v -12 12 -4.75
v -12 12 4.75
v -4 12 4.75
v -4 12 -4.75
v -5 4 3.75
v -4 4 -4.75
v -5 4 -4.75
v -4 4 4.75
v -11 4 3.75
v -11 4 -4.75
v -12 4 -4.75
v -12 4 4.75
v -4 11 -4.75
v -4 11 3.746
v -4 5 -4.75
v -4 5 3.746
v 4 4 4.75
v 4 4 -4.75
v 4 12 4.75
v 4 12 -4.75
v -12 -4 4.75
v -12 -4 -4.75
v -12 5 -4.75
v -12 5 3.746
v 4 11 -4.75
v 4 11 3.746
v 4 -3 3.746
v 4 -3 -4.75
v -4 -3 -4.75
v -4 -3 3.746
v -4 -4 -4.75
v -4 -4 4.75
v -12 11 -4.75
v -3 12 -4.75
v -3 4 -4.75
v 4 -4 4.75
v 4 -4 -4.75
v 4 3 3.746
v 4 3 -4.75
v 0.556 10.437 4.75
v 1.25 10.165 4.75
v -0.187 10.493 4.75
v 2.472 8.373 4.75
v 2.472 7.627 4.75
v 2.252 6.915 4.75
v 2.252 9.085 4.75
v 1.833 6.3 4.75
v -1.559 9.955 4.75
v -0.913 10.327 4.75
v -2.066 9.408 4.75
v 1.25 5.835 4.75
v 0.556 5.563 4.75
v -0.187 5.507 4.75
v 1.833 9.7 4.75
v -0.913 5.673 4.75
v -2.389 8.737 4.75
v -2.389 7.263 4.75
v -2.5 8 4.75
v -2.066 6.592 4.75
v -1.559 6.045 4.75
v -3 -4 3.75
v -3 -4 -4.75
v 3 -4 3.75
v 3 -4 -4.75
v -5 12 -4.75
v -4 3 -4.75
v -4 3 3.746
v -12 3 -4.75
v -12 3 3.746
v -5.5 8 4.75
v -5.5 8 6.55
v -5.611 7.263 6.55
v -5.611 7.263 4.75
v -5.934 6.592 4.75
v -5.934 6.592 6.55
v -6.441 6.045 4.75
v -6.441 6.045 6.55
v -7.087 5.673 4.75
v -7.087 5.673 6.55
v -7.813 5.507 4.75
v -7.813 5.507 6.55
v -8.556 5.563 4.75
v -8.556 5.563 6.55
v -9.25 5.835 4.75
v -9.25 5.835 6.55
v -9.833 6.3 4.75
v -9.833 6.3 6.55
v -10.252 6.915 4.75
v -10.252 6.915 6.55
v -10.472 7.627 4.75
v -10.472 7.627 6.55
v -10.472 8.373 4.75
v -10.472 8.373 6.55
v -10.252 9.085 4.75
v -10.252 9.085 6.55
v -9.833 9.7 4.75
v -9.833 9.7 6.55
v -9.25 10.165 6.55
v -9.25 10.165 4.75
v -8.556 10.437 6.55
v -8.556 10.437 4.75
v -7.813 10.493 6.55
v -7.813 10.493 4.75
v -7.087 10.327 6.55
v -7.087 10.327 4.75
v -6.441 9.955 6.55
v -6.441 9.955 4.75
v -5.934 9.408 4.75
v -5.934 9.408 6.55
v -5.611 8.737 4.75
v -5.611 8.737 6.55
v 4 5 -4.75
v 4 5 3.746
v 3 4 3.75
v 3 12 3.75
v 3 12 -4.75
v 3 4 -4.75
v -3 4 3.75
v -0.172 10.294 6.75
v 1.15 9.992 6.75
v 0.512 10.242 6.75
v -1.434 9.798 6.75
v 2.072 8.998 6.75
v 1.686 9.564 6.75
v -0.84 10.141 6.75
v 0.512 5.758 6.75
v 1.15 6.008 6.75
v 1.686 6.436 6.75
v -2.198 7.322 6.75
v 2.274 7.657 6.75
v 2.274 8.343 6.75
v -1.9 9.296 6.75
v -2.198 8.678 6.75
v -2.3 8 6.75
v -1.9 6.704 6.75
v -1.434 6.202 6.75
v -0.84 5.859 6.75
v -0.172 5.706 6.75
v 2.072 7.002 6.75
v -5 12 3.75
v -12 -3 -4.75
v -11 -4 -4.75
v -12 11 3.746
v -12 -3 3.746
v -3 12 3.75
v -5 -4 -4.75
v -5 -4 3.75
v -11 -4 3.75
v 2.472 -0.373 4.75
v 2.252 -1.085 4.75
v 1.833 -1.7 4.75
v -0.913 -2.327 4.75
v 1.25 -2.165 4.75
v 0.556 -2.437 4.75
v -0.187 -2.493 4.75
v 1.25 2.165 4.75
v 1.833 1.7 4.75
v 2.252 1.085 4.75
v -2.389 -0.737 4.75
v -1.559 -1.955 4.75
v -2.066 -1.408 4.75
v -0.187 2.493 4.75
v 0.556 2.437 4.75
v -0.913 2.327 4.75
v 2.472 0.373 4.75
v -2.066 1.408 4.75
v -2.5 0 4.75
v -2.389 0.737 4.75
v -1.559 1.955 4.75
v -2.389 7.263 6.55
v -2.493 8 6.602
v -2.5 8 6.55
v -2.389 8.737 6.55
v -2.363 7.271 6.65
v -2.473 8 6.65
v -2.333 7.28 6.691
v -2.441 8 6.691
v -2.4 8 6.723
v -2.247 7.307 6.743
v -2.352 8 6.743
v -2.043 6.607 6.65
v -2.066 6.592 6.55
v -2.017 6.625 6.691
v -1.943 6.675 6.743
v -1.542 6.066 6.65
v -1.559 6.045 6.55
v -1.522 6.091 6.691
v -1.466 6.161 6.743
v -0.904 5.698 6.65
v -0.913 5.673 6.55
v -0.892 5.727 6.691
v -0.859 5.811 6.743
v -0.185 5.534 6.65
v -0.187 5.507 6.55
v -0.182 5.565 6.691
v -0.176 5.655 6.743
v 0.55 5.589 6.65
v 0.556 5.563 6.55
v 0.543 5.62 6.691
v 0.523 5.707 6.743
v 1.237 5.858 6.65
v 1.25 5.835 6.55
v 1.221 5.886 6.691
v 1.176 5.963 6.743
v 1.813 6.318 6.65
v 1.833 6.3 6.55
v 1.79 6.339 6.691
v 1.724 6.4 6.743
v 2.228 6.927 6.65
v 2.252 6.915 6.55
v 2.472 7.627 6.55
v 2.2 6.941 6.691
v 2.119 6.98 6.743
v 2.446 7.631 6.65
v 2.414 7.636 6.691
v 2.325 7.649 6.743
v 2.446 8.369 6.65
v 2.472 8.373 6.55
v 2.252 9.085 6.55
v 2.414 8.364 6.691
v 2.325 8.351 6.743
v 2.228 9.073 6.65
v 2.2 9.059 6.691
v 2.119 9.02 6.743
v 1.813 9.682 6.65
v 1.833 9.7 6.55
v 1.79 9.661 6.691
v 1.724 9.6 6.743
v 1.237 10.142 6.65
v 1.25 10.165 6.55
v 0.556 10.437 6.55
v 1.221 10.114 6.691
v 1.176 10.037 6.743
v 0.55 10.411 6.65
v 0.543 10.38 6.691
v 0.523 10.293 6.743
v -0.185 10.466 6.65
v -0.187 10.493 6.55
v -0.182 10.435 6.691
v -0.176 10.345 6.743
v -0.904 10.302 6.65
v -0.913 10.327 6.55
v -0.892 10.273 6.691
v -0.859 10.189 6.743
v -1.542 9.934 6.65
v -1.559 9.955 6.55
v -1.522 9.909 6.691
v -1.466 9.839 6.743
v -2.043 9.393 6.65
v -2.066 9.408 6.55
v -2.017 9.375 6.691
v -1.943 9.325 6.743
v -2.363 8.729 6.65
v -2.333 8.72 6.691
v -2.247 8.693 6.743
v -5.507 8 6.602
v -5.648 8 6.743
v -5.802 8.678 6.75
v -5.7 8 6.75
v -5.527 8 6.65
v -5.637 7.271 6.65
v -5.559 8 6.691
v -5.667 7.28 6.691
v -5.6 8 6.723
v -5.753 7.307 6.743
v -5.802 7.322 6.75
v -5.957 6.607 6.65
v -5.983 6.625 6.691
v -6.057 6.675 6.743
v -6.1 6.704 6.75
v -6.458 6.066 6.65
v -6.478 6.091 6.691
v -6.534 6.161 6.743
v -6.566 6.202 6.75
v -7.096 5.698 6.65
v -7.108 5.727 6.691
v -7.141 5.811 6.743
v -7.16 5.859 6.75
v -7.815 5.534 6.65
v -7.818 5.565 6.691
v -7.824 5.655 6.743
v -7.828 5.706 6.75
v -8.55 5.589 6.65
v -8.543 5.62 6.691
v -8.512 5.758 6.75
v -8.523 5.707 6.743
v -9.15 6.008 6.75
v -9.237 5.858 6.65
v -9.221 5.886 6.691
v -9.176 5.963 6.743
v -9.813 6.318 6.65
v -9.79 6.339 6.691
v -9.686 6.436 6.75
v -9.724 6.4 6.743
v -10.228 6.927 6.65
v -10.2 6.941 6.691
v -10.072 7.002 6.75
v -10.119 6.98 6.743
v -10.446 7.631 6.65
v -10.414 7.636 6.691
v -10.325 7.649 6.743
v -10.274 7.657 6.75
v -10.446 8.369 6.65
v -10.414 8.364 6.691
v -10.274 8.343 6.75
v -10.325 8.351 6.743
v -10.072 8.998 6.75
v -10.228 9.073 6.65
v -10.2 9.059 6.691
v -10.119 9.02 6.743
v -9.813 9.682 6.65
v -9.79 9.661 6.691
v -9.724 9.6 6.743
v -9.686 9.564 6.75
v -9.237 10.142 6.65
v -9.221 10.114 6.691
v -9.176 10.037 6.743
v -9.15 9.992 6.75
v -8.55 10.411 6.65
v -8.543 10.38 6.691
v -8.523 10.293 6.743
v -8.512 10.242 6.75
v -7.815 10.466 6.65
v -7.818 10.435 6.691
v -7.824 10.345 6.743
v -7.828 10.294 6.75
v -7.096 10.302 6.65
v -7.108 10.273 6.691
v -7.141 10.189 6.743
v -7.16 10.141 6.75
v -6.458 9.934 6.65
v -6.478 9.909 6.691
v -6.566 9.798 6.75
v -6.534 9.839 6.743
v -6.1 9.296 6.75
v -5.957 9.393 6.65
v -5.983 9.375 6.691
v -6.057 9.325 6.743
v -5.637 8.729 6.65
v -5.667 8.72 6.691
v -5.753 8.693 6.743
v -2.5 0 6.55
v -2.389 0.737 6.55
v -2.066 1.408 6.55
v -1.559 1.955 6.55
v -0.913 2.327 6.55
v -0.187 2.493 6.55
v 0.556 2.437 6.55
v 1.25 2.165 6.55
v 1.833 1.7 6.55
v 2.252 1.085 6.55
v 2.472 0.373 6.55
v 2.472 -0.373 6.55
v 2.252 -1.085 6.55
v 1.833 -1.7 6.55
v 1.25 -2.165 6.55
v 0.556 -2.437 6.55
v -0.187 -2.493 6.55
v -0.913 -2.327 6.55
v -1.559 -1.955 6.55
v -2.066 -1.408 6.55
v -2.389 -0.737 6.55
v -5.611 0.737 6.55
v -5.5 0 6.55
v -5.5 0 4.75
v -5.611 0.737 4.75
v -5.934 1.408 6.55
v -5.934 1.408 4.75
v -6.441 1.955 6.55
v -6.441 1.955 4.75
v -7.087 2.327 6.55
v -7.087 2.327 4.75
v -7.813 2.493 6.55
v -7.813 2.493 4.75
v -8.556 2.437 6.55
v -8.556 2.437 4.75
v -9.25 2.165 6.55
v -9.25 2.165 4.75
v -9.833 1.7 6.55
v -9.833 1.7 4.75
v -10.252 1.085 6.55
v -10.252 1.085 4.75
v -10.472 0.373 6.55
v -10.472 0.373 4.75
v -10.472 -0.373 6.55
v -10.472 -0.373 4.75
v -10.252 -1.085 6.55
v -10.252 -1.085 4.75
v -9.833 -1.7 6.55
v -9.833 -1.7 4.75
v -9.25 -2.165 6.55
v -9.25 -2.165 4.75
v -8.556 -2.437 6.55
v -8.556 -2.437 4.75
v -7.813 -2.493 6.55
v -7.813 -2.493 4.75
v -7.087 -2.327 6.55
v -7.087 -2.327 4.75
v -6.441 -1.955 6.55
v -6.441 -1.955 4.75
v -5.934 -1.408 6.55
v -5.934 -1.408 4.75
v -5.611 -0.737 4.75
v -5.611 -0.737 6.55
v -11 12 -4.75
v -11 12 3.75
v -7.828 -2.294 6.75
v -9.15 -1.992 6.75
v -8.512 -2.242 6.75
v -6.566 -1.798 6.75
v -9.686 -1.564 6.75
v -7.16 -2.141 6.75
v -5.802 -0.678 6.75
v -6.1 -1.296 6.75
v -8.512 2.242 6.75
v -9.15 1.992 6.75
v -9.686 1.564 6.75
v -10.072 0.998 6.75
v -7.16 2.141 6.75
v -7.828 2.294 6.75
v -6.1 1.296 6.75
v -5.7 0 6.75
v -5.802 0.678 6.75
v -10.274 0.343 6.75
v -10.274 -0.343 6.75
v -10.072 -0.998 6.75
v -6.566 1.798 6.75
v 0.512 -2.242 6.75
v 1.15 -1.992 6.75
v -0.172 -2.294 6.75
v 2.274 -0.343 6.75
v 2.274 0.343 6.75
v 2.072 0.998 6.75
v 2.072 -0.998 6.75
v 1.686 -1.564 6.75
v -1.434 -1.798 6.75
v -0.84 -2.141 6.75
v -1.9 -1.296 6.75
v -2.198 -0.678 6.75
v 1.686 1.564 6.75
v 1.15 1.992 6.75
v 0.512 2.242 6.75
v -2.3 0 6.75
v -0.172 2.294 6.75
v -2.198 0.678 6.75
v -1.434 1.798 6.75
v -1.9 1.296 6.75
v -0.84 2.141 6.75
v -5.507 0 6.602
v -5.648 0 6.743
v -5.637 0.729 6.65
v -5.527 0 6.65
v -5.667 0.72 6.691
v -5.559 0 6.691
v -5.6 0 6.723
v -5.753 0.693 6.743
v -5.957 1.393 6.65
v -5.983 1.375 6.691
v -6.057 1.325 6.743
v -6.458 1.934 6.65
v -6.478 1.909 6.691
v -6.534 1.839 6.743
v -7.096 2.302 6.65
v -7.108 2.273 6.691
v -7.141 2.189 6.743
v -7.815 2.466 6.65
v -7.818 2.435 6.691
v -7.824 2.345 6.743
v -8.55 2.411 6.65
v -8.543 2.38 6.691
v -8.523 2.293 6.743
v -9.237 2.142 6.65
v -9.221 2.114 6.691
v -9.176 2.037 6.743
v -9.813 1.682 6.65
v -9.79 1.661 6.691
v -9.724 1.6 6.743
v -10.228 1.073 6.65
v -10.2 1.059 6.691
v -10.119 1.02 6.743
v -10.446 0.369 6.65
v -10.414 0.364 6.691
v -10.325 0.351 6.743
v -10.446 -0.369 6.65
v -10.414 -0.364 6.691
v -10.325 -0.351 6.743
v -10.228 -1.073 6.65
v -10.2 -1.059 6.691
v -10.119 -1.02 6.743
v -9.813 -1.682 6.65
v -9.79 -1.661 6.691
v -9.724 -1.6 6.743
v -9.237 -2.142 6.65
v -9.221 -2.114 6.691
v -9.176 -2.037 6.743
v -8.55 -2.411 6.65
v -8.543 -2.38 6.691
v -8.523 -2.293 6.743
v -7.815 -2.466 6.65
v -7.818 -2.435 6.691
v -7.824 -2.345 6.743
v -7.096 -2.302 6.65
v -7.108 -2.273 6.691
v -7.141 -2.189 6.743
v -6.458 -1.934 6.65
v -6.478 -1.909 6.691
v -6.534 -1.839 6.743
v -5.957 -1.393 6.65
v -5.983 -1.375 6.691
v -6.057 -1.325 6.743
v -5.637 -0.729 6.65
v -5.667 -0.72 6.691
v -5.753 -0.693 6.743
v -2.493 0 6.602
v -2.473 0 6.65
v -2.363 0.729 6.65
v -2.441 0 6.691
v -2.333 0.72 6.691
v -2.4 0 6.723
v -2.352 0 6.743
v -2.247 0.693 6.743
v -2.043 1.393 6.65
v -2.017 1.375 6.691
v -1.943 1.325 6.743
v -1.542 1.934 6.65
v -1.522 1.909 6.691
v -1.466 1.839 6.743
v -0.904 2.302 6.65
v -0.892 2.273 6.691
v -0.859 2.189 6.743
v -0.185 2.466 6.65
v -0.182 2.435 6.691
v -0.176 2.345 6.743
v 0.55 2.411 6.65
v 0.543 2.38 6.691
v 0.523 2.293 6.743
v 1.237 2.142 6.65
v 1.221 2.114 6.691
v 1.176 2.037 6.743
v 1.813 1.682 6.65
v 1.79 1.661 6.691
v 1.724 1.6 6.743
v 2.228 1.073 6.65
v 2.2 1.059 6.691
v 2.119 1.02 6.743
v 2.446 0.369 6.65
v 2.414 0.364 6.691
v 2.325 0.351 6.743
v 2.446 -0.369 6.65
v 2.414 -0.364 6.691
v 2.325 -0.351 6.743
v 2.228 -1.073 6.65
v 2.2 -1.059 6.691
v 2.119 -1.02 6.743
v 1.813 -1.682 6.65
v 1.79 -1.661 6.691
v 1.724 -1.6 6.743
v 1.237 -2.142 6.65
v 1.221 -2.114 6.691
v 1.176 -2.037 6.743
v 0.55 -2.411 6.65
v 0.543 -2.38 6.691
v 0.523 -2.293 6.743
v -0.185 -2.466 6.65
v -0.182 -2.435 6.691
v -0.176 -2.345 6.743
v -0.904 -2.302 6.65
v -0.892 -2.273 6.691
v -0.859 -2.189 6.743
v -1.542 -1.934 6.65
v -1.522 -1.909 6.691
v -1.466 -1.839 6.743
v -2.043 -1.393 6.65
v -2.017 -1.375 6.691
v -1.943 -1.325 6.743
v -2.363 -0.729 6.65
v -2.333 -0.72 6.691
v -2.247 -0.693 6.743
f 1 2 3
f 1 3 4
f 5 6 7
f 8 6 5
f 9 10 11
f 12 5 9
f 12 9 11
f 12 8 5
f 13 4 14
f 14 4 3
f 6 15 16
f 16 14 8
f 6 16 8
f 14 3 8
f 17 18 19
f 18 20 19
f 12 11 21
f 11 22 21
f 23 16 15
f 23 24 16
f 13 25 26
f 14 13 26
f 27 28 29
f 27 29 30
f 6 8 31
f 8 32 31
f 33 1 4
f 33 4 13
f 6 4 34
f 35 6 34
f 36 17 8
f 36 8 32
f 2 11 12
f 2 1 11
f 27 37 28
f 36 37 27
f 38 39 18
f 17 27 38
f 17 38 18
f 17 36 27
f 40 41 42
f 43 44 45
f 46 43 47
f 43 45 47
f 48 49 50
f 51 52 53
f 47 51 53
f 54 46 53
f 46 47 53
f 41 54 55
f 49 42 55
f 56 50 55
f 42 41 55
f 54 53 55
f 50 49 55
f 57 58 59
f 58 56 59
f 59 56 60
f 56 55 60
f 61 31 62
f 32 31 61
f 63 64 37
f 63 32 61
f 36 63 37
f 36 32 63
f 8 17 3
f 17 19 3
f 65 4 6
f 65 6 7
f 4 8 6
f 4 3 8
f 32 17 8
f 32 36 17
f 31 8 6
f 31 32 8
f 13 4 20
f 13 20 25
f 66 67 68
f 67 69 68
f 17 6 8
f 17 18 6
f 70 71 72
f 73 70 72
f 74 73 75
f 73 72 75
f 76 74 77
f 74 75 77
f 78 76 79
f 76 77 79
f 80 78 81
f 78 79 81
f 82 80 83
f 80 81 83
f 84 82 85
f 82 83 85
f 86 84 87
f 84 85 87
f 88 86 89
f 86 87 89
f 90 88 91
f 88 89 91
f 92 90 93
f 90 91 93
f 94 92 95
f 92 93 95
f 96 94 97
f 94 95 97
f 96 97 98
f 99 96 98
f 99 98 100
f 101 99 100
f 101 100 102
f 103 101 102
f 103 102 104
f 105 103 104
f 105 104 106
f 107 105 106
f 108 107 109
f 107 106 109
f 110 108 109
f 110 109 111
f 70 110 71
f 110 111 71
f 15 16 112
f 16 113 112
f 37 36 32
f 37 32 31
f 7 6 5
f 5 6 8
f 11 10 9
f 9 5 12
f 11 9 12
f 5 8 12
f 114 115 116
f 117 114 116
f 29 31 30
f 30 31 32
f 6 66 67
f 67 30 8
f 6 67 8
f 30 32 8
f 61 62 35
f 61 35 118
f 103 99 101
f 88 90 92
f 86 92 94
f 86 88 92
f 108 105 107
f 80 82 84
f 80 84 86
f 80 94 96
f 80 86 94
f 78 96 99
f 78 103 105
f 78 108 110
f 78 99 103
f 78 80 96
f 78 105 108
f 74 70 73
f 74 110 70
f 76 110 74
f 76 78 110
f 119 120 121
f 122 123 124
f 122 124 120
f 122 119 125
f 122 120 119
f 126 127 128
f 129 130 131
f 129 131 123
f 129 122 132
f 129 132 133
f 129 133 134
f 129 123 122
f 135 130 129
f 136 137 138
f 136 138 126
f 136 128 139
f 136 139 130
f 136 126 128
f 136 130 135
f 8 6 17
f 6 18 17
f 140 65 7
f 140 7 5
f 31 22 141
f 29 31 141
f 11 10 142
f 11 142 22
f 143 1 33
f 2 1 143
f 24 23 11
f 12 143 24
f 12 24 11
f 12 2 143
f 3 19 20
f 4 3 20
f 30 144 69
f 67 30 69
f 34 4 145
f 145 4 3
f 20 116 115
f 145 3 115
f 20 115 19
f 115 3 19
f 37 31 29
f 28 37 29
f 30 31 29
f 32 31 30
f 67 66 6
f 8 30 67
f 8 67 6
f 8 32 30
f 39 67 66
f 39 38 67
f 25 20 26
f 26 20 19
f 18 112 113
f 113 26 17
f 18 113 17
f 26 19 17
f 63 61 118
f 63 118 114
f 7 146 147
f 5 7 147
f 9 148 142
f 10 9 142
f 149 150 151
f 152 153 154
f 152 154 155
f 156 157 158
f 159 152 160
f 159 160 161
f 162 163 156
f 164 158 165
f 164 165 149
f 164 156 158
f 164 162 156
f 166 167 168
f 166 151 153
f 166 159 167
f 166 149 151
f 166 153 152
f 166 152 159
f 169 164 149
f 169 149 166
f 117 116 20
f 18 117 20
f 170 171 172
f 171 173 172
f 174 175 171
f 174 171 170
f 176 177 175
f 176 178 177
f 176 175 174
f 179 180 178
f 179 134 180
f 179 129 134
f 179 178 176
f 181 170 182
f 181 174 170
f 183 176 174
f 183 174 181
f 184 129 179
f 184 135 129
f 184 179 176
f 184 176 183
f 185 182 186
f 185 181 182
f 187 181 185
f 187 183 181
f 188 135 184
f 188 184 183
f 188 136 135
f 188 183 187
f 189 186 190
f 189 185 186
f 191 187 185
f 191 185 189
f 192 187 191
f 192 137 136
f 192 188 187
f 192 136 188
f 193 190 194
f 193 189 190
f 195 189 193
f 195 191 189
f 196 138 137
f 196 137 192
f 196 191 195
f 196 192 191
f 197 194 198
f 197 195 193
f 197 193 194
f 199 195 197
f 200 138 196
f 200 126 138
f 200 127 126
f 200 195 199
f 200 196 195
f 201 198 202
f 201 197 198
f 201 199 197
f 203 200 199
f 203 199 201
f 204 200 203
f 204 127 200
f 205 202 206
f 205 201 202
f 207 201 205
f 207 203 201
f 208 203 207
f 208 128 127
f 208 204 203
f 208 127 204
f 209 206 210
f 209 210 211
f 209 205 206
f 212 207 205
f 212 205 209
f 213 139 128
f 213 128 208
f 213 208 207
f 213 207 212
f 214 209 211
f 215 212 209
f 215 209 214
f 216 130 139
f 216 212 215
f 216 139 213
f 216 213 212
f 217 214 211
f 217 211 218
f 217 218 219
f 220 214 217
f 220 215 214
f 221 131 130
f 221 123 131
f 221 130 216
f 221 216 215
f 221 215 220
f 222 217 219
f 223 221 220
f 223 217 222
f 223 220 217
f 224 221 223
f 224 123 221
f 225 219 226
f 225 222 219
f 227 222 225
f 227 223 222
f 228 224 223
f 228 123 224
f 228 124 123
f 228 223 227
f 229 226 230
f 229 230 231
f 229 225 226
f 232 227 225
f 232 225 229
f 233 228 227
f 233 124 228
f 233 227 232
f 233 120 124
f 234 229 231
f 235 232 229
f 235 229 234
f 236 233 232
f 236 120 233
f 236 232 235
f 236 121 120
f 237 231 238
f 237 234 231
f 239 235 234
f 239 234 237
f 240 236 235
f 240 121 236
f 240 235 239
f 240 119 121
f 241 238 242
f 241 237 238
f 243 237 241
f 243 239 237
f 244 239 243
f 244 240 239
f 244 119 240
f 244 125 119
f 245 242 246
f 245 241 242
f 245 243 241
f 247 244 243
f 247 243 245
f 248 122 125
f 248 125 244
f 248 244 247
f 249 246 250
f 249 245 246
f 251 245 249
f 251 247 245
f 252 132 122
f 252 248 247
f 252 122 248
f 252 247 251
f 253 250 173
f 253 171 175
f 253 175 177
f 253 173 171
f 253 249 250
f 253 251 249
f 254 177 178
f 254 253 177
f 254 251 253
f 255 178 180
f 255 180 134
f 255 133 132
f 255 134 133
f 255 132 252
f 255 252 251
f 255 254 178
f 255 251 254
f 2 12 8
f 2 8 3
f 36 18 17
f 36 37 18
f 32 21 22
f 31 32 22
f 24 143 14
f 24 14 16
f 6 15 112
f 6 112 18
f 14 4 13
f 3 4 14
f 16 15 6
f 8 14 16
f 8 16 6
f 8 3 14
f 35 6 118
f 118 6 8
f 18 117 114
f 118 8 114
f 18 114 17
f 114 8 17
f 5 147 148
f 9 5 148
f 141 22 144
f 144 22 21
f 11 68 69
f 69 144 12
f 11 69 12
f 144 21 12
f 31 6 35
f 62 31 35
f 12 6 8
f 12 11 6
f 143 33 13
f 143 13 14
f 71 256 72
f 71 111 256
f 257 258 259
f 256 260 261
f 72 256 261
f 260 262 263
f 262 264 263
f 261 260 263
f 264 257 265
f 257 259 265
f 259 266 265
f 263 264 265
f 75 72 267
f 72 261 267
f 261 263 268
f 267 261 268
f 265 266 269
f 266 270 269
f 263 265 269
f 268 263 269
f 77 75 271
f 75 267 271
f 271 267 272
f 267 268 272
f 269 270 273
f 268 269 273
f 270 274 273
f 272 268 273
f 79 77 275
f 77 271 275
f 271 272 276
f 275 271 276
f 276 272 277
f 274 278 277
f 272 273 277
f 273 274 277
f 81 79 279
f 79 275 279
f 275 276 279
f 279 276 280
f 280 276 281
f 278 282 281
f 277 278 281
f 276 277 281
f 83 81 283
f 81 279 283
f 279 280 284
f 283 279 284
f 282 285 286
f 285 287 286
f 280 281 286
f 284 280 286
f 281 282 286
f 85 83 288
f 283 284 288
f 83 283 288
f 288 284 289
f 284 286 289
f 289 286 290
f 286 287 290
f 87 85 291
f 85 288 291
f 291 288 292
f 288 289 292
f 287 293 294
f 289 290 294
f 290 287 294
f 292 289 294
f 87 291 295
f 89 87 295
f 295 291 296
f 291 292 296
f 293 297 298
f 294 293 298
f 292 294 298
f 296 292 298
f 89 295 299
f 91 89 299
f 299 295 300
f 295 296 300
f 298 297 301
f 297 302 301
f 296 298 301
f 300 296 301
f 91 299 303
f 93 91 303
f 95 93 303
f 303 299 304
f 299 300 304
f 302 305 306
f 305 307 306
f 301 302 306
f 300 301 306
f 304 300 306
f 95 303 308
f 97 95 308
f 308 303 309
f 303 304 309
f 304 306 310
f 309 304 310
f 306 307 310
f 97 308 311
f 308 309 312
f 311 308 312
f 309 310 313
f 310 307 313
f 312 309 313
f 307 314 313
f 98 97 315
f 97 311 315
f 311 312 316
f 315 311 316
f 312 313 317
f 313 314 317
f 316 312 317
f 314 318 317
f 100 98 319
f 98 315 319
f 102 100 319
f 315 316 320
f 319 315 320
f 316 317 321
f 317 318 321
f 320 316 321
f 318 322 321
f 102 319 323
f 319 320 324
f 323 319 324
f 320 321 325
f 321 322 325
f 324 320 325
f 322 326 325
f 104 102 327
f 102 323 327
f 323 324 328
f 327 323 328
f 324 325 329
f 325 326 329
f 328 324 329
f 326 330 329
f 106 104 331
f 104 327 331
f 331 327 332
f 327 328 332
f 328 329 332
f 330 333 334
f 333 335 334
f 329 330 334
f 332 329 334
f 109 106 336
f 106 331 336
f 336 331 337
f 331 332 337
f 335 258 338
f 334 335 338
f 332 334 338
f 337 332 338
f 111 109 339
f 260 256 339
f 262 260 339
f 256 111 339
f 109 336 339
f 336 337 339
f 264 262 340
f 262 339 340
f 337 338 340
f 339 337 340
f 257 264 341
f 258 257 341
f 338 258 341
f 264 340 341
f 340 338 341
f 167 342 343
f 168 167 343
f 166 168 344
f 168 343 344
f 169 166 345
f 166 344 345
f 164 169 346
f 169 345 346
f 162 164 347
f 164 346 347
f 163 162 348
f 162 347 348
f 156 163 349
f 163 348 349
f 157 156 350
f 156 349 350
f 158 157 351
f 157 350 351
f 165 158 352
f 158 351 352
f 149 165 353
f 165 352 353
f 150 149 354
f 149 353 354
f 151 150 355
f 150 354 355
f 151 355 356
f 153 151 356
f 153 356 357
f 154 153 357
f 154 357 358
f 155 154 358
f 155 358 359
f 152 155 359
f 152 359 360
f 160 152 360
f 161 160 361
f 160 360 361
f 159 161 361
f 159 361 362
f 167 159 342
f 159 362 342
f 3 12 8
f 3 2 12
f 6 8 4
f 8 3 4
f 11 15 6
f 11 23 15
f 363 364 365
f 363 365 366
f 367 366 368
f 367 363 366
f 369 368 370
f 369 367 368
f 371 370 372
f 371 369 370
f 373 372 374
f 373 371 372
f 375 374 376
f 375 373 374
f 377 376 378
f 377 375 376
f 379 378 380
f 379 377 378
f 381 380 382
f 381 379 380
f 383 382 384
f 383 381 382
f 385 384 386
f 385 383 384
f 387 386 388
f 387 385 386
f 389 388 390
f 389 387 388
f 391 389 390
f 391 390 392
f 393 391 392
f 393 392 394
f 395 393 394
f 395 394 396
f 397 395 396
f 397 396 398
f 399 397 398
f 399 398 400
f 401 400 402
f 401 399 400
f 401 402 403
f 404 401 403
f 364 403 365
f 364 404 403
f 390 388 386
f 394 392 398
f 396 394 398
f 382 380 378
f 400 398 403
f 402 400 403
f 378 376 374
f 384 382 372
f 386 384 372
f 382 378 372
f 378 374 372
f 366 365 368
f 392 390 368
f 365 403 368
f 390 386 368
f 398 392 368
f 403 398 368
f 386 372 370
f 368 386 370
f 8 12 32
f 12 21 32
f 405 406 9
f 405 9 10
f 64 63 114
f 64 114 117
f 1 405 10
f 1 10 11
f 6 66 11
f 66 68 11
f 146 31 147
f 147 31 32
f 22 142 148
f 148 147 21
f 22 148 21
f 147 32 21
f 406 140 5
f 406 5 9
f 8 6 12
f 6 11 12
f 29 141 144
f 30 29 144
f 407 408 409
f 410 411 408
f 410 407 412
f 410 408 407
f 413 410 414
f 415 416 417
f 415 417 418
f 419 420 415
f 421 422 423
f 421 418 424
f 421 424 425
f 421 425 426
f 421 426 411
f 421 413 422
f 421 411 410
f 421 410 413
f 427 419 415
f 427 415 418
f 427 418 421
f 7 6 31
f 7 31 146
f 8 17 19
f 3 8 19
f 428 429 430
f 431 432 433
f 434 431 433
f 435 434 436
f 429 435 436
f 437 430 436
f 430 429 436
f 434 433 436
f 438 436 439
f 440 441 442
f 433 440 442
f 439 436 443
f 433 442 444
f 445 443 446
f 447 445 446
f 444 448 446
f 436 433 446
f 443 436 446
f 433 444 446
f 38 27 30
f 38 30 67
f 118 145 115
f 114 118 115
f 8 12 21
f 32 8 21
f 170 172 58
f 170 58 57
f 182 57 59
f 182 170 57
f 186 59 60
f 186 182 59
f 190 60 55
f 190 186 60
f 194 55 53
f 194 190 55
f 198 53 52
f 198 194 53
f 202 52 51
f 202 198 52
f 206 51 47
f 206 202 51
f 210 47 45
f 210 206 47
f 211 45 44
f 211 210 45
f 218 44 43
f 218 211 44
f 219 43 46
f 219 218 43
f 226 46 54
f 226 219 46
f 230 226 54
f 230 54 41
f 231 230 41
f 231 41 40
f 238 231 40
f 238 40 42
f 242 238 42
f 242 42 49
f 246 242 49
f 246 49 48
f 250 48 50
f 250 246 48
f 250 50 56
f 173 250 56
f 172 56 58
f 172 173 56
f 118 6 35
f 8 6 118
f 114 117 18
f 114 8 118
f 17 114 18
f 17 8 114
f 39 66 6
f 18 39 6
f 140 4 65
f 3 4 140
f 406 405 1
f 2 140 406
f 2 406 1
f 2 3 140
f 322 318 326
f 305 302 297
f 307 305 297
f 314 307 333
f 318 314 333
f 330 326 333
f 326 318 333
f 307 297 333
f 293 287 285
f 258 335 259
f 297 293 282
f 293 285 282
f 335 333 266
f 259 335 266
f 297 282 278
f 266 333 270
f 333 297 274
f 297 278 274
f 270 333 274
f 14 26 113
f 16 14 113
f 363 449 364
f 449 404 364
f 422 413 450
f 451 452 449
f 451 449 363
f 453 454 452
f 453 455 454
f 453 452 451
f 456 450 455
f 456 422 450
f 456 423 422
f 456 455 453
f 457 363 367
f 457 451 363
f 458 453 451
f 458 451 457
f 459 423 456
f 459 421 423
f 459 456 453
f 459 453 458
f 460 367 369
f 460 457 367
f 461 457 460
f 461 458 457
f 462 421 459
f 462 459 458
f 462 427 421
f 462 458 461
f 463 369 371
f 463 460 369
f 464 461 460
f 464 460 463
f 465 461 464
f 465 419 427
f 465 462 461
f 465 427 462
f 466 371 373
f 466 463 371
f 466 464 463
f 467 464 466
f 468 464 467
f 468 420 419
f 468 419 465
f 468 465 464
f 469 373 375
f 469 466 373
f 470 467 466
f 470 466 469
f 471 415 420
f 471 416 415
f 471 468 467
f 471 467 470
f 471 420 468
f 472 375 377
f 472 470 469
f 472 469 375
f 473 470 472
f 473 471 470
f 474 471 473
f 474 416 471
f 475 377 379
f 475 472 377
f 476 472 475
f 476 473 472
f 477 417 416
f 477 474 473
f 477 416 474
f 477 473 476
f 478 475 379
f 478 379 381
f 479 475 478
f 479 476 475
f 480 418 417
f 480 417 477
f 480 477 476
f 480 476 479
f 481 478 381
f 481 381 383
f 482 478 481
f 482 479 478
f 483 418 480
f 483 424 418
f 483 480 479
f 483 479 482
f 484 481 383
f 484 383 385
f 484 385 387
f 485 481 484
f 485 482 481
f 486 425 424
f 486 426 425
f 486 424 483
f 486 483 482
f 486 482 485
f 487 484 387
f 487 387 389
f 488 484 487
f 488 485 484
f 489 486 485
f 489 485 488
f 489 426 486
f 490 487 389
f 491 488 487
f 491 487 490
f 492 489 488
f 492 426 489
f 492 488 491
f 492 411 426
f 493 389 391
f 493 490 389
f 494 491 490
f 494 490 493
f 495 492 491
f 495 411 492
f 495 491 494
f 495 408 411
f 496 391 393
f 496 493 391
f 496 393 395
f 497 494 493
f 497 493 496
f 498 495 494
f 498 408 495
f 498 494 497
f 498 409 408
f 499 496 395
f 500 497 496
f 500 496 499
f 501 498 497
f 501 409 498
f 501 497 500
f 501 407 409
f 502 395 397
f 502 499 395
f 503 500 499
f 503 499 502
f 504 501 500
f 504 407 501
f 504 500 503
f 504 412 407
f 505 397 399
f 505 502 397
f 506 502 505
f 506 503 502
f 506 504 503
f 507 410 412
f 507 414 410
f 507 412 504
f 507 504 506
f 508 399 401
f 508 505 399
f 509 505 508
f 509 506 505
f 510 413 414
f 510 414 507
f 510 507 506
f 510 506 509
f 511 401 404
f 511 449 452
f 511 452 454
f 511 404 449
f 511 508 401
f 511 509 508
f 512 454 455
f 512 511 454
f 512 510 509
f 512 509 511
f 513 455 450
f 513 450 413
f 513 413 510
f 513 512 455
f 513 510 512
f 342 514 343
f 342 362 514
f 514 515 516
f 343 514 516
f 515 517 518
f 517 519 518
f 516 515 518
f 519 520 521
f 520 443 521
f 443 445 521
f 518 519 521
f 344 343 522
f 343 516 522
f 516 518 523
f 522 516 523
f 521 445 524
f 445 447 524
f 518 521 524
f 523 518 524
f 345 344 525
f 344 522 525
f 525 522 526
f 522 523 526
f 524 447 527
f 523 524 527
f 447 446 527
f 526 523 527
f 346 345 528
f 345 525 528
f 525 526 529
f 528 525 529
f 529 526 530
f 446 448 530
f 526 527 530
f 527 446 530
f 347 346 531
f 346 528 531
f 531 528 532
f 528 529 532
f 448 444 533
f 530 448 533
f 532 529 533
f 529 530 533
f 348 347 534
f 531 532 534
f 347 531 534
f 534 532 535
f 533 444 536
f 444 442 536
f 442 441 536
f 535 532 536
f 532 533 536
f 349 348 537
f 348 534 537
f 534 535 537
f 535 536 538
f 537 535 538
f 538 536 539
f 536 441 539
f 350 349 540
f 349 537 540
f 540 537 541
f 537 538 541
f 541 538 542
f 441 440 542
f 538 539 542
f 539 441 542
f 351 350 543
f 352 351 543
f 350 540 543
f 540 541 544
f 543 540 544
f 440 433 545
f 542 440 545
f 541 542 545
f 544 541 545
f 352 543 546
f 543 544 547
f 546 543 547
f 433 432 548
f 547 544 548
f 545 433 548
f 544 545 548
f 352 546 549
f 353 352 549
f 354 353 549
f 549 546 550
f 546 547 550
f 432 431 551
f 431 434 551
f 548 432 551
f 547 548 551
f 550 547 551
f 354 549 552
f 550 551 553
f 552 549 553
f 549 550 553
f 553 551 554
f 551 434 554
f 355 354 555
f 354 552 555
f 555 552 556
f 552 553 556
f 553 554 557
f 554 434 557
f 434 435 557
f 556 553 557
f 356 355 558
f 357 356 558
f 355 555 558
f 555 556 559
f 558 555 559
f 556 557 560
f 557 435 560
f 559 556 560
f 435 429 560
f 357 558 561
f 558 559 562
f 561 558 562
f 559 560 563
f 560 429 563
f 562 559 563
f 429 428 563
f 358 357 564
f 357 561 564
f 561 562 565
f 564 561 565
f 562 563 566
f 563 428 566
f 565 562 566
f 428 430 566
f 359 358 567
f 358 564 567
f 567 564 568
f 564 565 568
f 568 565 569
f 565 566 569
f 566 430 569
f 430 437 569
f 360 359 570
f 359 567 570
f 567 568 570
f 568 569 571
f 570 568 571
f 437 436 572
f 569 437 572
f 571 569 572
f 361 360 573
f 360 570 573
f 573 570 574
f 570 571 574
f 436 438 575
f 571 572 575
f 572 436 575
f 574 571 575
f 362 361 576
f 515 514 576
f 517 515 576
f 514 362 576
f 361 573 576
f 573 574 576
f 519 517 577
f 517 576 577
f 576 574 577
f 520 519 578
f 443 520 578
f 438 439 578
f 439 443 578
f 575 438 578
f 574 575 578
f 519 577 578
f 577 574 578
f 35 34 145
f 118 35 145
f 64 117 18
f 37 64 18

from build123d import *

# Parameters (mm, degrees)
F0_W     = 2.5
F0_H     = 2
F2_R     = 0.2
F4_DEPTH = 4
F5_DEPTH = 4


with BuildPart() as f1:
    # F0 (on Front) → F1 (revolve)
    with BuildSketch(Plane.XZ):
        with Locations((-1.25, 5.75)):
            Rectangle(F0_W, F0_H)
    revolve(axis=Axis((0, 0, 5.75), (0, 0, -1)))

    # F2
    f2_edges = [f1.edges().sort_by_distance(p)[0] for p in [
        (2.5, 0, 6.75),
    ]]
    fillet(f2_edges, radius=F2_R)


with BuildPart() as f4:
    # F3 (on Right) → F4 (new body, symmetric)
    with BuildSketch(Plane.YZ):
        Polygon((4, -4.75), (4, 4.75), (-4, 4.75), (-4, -4.75), (-3, -4.75), (-3, 3.7460238673), (0, 3.7460238673), (3, 3.7460238673), (3, -4.75), align=None)
    extrude(amount=F4_DEPTH, both=True)


with BuildPart() as f5:
    # F0 (on Front) → F5 (new body, symmetric)
    with BuildSketch(Plane.XZ):
        Polygon((0, 3.75), (0, 4.75), (-2.5, 4.75), (-4, 4.75), (-4, -4.75), (-3, -4.75), (-3, 3.75), align=None)
        Polygon((4, 4.75), (0, 4.75), (0, 3.75), (3, 3.75), (3, -4.75), (4, -4.75), align=None)
    extrude(amount=F5_DEPTH, both=True)


with BuildPart() as f6_1:
    # F6: instance of F1
    add(f1.part.mirror(Plane(origin=(-4, 0, 0), x_dir=(0, -1, 0), z_dir=(-1, 0, 0))))


with BuildPart() as f6_2:
    # F6: instance of F5
    add(f5.part.mirror(Plane(origin=(-4, 0, 0), x_dir=(0, -1, 0), z_dir=(-1, 0, 0))))


with BuildPart() as f6_3:
    # F6: instance of F4
    add(f4.part.mirror(Plane(origin=(-4, 0, 0), x_dir=(0, -1, 0), z_dir=(-1, 0, 0))))


with BuildPart() as f7_1:
    # F7: instance of F1
    add(f1.part.mirror(Plane(origin=(-8, 4, 0), x_dir=(-1, 0, 0), z_dir=(0, 1, 0))))


with BuildPart() as f7_2:
    # F7: instance of F4
    add(f4.part.mirror(Plane(origin=(-8, 4, 0), x_dir=(-1, 0, 0), z_dir=(0, 1, 0))))


with BuildPart() as f7_3:
    # F7: instance of F5
    add(f5.part.mirror(Plane(origin=(-8, 4, 0), x_dir=(-1, 0, 0), z_dir=(0, 1, 0))))


with BuildPart() as f7_4:
    # F7: instance of F6_1
    add(f6_1.part.mirror(Plane(origin=(-8, 4, 0), x_dir=(-1, 0, 0), z_dir=(0, 1, 0))))


with BuildPart() as f7_5:
    # F7: instance of F6_3
    add(f6_3.part.mirror(Plane(origin=(-8, 4, 0), x_dir=(-1, 0, 0), z_dir=(0, 1, 0))))


with BuildPart() as f7_6:
    # F7: instance of F6_2
    add(f6_2.part.mirror(Plane(origin=(-8, 4, 0), x_dir=(-1, 0, 0), z_dir=(0, 1, 0))))


solid = Compound([f1.part, f4.part, f5.part, f6_1.part, f6_2.part, f6_3.part, f7_1.part, f7_2.part, f7_3.part, f7_4.part, f7_5.part, f7_6.part])
